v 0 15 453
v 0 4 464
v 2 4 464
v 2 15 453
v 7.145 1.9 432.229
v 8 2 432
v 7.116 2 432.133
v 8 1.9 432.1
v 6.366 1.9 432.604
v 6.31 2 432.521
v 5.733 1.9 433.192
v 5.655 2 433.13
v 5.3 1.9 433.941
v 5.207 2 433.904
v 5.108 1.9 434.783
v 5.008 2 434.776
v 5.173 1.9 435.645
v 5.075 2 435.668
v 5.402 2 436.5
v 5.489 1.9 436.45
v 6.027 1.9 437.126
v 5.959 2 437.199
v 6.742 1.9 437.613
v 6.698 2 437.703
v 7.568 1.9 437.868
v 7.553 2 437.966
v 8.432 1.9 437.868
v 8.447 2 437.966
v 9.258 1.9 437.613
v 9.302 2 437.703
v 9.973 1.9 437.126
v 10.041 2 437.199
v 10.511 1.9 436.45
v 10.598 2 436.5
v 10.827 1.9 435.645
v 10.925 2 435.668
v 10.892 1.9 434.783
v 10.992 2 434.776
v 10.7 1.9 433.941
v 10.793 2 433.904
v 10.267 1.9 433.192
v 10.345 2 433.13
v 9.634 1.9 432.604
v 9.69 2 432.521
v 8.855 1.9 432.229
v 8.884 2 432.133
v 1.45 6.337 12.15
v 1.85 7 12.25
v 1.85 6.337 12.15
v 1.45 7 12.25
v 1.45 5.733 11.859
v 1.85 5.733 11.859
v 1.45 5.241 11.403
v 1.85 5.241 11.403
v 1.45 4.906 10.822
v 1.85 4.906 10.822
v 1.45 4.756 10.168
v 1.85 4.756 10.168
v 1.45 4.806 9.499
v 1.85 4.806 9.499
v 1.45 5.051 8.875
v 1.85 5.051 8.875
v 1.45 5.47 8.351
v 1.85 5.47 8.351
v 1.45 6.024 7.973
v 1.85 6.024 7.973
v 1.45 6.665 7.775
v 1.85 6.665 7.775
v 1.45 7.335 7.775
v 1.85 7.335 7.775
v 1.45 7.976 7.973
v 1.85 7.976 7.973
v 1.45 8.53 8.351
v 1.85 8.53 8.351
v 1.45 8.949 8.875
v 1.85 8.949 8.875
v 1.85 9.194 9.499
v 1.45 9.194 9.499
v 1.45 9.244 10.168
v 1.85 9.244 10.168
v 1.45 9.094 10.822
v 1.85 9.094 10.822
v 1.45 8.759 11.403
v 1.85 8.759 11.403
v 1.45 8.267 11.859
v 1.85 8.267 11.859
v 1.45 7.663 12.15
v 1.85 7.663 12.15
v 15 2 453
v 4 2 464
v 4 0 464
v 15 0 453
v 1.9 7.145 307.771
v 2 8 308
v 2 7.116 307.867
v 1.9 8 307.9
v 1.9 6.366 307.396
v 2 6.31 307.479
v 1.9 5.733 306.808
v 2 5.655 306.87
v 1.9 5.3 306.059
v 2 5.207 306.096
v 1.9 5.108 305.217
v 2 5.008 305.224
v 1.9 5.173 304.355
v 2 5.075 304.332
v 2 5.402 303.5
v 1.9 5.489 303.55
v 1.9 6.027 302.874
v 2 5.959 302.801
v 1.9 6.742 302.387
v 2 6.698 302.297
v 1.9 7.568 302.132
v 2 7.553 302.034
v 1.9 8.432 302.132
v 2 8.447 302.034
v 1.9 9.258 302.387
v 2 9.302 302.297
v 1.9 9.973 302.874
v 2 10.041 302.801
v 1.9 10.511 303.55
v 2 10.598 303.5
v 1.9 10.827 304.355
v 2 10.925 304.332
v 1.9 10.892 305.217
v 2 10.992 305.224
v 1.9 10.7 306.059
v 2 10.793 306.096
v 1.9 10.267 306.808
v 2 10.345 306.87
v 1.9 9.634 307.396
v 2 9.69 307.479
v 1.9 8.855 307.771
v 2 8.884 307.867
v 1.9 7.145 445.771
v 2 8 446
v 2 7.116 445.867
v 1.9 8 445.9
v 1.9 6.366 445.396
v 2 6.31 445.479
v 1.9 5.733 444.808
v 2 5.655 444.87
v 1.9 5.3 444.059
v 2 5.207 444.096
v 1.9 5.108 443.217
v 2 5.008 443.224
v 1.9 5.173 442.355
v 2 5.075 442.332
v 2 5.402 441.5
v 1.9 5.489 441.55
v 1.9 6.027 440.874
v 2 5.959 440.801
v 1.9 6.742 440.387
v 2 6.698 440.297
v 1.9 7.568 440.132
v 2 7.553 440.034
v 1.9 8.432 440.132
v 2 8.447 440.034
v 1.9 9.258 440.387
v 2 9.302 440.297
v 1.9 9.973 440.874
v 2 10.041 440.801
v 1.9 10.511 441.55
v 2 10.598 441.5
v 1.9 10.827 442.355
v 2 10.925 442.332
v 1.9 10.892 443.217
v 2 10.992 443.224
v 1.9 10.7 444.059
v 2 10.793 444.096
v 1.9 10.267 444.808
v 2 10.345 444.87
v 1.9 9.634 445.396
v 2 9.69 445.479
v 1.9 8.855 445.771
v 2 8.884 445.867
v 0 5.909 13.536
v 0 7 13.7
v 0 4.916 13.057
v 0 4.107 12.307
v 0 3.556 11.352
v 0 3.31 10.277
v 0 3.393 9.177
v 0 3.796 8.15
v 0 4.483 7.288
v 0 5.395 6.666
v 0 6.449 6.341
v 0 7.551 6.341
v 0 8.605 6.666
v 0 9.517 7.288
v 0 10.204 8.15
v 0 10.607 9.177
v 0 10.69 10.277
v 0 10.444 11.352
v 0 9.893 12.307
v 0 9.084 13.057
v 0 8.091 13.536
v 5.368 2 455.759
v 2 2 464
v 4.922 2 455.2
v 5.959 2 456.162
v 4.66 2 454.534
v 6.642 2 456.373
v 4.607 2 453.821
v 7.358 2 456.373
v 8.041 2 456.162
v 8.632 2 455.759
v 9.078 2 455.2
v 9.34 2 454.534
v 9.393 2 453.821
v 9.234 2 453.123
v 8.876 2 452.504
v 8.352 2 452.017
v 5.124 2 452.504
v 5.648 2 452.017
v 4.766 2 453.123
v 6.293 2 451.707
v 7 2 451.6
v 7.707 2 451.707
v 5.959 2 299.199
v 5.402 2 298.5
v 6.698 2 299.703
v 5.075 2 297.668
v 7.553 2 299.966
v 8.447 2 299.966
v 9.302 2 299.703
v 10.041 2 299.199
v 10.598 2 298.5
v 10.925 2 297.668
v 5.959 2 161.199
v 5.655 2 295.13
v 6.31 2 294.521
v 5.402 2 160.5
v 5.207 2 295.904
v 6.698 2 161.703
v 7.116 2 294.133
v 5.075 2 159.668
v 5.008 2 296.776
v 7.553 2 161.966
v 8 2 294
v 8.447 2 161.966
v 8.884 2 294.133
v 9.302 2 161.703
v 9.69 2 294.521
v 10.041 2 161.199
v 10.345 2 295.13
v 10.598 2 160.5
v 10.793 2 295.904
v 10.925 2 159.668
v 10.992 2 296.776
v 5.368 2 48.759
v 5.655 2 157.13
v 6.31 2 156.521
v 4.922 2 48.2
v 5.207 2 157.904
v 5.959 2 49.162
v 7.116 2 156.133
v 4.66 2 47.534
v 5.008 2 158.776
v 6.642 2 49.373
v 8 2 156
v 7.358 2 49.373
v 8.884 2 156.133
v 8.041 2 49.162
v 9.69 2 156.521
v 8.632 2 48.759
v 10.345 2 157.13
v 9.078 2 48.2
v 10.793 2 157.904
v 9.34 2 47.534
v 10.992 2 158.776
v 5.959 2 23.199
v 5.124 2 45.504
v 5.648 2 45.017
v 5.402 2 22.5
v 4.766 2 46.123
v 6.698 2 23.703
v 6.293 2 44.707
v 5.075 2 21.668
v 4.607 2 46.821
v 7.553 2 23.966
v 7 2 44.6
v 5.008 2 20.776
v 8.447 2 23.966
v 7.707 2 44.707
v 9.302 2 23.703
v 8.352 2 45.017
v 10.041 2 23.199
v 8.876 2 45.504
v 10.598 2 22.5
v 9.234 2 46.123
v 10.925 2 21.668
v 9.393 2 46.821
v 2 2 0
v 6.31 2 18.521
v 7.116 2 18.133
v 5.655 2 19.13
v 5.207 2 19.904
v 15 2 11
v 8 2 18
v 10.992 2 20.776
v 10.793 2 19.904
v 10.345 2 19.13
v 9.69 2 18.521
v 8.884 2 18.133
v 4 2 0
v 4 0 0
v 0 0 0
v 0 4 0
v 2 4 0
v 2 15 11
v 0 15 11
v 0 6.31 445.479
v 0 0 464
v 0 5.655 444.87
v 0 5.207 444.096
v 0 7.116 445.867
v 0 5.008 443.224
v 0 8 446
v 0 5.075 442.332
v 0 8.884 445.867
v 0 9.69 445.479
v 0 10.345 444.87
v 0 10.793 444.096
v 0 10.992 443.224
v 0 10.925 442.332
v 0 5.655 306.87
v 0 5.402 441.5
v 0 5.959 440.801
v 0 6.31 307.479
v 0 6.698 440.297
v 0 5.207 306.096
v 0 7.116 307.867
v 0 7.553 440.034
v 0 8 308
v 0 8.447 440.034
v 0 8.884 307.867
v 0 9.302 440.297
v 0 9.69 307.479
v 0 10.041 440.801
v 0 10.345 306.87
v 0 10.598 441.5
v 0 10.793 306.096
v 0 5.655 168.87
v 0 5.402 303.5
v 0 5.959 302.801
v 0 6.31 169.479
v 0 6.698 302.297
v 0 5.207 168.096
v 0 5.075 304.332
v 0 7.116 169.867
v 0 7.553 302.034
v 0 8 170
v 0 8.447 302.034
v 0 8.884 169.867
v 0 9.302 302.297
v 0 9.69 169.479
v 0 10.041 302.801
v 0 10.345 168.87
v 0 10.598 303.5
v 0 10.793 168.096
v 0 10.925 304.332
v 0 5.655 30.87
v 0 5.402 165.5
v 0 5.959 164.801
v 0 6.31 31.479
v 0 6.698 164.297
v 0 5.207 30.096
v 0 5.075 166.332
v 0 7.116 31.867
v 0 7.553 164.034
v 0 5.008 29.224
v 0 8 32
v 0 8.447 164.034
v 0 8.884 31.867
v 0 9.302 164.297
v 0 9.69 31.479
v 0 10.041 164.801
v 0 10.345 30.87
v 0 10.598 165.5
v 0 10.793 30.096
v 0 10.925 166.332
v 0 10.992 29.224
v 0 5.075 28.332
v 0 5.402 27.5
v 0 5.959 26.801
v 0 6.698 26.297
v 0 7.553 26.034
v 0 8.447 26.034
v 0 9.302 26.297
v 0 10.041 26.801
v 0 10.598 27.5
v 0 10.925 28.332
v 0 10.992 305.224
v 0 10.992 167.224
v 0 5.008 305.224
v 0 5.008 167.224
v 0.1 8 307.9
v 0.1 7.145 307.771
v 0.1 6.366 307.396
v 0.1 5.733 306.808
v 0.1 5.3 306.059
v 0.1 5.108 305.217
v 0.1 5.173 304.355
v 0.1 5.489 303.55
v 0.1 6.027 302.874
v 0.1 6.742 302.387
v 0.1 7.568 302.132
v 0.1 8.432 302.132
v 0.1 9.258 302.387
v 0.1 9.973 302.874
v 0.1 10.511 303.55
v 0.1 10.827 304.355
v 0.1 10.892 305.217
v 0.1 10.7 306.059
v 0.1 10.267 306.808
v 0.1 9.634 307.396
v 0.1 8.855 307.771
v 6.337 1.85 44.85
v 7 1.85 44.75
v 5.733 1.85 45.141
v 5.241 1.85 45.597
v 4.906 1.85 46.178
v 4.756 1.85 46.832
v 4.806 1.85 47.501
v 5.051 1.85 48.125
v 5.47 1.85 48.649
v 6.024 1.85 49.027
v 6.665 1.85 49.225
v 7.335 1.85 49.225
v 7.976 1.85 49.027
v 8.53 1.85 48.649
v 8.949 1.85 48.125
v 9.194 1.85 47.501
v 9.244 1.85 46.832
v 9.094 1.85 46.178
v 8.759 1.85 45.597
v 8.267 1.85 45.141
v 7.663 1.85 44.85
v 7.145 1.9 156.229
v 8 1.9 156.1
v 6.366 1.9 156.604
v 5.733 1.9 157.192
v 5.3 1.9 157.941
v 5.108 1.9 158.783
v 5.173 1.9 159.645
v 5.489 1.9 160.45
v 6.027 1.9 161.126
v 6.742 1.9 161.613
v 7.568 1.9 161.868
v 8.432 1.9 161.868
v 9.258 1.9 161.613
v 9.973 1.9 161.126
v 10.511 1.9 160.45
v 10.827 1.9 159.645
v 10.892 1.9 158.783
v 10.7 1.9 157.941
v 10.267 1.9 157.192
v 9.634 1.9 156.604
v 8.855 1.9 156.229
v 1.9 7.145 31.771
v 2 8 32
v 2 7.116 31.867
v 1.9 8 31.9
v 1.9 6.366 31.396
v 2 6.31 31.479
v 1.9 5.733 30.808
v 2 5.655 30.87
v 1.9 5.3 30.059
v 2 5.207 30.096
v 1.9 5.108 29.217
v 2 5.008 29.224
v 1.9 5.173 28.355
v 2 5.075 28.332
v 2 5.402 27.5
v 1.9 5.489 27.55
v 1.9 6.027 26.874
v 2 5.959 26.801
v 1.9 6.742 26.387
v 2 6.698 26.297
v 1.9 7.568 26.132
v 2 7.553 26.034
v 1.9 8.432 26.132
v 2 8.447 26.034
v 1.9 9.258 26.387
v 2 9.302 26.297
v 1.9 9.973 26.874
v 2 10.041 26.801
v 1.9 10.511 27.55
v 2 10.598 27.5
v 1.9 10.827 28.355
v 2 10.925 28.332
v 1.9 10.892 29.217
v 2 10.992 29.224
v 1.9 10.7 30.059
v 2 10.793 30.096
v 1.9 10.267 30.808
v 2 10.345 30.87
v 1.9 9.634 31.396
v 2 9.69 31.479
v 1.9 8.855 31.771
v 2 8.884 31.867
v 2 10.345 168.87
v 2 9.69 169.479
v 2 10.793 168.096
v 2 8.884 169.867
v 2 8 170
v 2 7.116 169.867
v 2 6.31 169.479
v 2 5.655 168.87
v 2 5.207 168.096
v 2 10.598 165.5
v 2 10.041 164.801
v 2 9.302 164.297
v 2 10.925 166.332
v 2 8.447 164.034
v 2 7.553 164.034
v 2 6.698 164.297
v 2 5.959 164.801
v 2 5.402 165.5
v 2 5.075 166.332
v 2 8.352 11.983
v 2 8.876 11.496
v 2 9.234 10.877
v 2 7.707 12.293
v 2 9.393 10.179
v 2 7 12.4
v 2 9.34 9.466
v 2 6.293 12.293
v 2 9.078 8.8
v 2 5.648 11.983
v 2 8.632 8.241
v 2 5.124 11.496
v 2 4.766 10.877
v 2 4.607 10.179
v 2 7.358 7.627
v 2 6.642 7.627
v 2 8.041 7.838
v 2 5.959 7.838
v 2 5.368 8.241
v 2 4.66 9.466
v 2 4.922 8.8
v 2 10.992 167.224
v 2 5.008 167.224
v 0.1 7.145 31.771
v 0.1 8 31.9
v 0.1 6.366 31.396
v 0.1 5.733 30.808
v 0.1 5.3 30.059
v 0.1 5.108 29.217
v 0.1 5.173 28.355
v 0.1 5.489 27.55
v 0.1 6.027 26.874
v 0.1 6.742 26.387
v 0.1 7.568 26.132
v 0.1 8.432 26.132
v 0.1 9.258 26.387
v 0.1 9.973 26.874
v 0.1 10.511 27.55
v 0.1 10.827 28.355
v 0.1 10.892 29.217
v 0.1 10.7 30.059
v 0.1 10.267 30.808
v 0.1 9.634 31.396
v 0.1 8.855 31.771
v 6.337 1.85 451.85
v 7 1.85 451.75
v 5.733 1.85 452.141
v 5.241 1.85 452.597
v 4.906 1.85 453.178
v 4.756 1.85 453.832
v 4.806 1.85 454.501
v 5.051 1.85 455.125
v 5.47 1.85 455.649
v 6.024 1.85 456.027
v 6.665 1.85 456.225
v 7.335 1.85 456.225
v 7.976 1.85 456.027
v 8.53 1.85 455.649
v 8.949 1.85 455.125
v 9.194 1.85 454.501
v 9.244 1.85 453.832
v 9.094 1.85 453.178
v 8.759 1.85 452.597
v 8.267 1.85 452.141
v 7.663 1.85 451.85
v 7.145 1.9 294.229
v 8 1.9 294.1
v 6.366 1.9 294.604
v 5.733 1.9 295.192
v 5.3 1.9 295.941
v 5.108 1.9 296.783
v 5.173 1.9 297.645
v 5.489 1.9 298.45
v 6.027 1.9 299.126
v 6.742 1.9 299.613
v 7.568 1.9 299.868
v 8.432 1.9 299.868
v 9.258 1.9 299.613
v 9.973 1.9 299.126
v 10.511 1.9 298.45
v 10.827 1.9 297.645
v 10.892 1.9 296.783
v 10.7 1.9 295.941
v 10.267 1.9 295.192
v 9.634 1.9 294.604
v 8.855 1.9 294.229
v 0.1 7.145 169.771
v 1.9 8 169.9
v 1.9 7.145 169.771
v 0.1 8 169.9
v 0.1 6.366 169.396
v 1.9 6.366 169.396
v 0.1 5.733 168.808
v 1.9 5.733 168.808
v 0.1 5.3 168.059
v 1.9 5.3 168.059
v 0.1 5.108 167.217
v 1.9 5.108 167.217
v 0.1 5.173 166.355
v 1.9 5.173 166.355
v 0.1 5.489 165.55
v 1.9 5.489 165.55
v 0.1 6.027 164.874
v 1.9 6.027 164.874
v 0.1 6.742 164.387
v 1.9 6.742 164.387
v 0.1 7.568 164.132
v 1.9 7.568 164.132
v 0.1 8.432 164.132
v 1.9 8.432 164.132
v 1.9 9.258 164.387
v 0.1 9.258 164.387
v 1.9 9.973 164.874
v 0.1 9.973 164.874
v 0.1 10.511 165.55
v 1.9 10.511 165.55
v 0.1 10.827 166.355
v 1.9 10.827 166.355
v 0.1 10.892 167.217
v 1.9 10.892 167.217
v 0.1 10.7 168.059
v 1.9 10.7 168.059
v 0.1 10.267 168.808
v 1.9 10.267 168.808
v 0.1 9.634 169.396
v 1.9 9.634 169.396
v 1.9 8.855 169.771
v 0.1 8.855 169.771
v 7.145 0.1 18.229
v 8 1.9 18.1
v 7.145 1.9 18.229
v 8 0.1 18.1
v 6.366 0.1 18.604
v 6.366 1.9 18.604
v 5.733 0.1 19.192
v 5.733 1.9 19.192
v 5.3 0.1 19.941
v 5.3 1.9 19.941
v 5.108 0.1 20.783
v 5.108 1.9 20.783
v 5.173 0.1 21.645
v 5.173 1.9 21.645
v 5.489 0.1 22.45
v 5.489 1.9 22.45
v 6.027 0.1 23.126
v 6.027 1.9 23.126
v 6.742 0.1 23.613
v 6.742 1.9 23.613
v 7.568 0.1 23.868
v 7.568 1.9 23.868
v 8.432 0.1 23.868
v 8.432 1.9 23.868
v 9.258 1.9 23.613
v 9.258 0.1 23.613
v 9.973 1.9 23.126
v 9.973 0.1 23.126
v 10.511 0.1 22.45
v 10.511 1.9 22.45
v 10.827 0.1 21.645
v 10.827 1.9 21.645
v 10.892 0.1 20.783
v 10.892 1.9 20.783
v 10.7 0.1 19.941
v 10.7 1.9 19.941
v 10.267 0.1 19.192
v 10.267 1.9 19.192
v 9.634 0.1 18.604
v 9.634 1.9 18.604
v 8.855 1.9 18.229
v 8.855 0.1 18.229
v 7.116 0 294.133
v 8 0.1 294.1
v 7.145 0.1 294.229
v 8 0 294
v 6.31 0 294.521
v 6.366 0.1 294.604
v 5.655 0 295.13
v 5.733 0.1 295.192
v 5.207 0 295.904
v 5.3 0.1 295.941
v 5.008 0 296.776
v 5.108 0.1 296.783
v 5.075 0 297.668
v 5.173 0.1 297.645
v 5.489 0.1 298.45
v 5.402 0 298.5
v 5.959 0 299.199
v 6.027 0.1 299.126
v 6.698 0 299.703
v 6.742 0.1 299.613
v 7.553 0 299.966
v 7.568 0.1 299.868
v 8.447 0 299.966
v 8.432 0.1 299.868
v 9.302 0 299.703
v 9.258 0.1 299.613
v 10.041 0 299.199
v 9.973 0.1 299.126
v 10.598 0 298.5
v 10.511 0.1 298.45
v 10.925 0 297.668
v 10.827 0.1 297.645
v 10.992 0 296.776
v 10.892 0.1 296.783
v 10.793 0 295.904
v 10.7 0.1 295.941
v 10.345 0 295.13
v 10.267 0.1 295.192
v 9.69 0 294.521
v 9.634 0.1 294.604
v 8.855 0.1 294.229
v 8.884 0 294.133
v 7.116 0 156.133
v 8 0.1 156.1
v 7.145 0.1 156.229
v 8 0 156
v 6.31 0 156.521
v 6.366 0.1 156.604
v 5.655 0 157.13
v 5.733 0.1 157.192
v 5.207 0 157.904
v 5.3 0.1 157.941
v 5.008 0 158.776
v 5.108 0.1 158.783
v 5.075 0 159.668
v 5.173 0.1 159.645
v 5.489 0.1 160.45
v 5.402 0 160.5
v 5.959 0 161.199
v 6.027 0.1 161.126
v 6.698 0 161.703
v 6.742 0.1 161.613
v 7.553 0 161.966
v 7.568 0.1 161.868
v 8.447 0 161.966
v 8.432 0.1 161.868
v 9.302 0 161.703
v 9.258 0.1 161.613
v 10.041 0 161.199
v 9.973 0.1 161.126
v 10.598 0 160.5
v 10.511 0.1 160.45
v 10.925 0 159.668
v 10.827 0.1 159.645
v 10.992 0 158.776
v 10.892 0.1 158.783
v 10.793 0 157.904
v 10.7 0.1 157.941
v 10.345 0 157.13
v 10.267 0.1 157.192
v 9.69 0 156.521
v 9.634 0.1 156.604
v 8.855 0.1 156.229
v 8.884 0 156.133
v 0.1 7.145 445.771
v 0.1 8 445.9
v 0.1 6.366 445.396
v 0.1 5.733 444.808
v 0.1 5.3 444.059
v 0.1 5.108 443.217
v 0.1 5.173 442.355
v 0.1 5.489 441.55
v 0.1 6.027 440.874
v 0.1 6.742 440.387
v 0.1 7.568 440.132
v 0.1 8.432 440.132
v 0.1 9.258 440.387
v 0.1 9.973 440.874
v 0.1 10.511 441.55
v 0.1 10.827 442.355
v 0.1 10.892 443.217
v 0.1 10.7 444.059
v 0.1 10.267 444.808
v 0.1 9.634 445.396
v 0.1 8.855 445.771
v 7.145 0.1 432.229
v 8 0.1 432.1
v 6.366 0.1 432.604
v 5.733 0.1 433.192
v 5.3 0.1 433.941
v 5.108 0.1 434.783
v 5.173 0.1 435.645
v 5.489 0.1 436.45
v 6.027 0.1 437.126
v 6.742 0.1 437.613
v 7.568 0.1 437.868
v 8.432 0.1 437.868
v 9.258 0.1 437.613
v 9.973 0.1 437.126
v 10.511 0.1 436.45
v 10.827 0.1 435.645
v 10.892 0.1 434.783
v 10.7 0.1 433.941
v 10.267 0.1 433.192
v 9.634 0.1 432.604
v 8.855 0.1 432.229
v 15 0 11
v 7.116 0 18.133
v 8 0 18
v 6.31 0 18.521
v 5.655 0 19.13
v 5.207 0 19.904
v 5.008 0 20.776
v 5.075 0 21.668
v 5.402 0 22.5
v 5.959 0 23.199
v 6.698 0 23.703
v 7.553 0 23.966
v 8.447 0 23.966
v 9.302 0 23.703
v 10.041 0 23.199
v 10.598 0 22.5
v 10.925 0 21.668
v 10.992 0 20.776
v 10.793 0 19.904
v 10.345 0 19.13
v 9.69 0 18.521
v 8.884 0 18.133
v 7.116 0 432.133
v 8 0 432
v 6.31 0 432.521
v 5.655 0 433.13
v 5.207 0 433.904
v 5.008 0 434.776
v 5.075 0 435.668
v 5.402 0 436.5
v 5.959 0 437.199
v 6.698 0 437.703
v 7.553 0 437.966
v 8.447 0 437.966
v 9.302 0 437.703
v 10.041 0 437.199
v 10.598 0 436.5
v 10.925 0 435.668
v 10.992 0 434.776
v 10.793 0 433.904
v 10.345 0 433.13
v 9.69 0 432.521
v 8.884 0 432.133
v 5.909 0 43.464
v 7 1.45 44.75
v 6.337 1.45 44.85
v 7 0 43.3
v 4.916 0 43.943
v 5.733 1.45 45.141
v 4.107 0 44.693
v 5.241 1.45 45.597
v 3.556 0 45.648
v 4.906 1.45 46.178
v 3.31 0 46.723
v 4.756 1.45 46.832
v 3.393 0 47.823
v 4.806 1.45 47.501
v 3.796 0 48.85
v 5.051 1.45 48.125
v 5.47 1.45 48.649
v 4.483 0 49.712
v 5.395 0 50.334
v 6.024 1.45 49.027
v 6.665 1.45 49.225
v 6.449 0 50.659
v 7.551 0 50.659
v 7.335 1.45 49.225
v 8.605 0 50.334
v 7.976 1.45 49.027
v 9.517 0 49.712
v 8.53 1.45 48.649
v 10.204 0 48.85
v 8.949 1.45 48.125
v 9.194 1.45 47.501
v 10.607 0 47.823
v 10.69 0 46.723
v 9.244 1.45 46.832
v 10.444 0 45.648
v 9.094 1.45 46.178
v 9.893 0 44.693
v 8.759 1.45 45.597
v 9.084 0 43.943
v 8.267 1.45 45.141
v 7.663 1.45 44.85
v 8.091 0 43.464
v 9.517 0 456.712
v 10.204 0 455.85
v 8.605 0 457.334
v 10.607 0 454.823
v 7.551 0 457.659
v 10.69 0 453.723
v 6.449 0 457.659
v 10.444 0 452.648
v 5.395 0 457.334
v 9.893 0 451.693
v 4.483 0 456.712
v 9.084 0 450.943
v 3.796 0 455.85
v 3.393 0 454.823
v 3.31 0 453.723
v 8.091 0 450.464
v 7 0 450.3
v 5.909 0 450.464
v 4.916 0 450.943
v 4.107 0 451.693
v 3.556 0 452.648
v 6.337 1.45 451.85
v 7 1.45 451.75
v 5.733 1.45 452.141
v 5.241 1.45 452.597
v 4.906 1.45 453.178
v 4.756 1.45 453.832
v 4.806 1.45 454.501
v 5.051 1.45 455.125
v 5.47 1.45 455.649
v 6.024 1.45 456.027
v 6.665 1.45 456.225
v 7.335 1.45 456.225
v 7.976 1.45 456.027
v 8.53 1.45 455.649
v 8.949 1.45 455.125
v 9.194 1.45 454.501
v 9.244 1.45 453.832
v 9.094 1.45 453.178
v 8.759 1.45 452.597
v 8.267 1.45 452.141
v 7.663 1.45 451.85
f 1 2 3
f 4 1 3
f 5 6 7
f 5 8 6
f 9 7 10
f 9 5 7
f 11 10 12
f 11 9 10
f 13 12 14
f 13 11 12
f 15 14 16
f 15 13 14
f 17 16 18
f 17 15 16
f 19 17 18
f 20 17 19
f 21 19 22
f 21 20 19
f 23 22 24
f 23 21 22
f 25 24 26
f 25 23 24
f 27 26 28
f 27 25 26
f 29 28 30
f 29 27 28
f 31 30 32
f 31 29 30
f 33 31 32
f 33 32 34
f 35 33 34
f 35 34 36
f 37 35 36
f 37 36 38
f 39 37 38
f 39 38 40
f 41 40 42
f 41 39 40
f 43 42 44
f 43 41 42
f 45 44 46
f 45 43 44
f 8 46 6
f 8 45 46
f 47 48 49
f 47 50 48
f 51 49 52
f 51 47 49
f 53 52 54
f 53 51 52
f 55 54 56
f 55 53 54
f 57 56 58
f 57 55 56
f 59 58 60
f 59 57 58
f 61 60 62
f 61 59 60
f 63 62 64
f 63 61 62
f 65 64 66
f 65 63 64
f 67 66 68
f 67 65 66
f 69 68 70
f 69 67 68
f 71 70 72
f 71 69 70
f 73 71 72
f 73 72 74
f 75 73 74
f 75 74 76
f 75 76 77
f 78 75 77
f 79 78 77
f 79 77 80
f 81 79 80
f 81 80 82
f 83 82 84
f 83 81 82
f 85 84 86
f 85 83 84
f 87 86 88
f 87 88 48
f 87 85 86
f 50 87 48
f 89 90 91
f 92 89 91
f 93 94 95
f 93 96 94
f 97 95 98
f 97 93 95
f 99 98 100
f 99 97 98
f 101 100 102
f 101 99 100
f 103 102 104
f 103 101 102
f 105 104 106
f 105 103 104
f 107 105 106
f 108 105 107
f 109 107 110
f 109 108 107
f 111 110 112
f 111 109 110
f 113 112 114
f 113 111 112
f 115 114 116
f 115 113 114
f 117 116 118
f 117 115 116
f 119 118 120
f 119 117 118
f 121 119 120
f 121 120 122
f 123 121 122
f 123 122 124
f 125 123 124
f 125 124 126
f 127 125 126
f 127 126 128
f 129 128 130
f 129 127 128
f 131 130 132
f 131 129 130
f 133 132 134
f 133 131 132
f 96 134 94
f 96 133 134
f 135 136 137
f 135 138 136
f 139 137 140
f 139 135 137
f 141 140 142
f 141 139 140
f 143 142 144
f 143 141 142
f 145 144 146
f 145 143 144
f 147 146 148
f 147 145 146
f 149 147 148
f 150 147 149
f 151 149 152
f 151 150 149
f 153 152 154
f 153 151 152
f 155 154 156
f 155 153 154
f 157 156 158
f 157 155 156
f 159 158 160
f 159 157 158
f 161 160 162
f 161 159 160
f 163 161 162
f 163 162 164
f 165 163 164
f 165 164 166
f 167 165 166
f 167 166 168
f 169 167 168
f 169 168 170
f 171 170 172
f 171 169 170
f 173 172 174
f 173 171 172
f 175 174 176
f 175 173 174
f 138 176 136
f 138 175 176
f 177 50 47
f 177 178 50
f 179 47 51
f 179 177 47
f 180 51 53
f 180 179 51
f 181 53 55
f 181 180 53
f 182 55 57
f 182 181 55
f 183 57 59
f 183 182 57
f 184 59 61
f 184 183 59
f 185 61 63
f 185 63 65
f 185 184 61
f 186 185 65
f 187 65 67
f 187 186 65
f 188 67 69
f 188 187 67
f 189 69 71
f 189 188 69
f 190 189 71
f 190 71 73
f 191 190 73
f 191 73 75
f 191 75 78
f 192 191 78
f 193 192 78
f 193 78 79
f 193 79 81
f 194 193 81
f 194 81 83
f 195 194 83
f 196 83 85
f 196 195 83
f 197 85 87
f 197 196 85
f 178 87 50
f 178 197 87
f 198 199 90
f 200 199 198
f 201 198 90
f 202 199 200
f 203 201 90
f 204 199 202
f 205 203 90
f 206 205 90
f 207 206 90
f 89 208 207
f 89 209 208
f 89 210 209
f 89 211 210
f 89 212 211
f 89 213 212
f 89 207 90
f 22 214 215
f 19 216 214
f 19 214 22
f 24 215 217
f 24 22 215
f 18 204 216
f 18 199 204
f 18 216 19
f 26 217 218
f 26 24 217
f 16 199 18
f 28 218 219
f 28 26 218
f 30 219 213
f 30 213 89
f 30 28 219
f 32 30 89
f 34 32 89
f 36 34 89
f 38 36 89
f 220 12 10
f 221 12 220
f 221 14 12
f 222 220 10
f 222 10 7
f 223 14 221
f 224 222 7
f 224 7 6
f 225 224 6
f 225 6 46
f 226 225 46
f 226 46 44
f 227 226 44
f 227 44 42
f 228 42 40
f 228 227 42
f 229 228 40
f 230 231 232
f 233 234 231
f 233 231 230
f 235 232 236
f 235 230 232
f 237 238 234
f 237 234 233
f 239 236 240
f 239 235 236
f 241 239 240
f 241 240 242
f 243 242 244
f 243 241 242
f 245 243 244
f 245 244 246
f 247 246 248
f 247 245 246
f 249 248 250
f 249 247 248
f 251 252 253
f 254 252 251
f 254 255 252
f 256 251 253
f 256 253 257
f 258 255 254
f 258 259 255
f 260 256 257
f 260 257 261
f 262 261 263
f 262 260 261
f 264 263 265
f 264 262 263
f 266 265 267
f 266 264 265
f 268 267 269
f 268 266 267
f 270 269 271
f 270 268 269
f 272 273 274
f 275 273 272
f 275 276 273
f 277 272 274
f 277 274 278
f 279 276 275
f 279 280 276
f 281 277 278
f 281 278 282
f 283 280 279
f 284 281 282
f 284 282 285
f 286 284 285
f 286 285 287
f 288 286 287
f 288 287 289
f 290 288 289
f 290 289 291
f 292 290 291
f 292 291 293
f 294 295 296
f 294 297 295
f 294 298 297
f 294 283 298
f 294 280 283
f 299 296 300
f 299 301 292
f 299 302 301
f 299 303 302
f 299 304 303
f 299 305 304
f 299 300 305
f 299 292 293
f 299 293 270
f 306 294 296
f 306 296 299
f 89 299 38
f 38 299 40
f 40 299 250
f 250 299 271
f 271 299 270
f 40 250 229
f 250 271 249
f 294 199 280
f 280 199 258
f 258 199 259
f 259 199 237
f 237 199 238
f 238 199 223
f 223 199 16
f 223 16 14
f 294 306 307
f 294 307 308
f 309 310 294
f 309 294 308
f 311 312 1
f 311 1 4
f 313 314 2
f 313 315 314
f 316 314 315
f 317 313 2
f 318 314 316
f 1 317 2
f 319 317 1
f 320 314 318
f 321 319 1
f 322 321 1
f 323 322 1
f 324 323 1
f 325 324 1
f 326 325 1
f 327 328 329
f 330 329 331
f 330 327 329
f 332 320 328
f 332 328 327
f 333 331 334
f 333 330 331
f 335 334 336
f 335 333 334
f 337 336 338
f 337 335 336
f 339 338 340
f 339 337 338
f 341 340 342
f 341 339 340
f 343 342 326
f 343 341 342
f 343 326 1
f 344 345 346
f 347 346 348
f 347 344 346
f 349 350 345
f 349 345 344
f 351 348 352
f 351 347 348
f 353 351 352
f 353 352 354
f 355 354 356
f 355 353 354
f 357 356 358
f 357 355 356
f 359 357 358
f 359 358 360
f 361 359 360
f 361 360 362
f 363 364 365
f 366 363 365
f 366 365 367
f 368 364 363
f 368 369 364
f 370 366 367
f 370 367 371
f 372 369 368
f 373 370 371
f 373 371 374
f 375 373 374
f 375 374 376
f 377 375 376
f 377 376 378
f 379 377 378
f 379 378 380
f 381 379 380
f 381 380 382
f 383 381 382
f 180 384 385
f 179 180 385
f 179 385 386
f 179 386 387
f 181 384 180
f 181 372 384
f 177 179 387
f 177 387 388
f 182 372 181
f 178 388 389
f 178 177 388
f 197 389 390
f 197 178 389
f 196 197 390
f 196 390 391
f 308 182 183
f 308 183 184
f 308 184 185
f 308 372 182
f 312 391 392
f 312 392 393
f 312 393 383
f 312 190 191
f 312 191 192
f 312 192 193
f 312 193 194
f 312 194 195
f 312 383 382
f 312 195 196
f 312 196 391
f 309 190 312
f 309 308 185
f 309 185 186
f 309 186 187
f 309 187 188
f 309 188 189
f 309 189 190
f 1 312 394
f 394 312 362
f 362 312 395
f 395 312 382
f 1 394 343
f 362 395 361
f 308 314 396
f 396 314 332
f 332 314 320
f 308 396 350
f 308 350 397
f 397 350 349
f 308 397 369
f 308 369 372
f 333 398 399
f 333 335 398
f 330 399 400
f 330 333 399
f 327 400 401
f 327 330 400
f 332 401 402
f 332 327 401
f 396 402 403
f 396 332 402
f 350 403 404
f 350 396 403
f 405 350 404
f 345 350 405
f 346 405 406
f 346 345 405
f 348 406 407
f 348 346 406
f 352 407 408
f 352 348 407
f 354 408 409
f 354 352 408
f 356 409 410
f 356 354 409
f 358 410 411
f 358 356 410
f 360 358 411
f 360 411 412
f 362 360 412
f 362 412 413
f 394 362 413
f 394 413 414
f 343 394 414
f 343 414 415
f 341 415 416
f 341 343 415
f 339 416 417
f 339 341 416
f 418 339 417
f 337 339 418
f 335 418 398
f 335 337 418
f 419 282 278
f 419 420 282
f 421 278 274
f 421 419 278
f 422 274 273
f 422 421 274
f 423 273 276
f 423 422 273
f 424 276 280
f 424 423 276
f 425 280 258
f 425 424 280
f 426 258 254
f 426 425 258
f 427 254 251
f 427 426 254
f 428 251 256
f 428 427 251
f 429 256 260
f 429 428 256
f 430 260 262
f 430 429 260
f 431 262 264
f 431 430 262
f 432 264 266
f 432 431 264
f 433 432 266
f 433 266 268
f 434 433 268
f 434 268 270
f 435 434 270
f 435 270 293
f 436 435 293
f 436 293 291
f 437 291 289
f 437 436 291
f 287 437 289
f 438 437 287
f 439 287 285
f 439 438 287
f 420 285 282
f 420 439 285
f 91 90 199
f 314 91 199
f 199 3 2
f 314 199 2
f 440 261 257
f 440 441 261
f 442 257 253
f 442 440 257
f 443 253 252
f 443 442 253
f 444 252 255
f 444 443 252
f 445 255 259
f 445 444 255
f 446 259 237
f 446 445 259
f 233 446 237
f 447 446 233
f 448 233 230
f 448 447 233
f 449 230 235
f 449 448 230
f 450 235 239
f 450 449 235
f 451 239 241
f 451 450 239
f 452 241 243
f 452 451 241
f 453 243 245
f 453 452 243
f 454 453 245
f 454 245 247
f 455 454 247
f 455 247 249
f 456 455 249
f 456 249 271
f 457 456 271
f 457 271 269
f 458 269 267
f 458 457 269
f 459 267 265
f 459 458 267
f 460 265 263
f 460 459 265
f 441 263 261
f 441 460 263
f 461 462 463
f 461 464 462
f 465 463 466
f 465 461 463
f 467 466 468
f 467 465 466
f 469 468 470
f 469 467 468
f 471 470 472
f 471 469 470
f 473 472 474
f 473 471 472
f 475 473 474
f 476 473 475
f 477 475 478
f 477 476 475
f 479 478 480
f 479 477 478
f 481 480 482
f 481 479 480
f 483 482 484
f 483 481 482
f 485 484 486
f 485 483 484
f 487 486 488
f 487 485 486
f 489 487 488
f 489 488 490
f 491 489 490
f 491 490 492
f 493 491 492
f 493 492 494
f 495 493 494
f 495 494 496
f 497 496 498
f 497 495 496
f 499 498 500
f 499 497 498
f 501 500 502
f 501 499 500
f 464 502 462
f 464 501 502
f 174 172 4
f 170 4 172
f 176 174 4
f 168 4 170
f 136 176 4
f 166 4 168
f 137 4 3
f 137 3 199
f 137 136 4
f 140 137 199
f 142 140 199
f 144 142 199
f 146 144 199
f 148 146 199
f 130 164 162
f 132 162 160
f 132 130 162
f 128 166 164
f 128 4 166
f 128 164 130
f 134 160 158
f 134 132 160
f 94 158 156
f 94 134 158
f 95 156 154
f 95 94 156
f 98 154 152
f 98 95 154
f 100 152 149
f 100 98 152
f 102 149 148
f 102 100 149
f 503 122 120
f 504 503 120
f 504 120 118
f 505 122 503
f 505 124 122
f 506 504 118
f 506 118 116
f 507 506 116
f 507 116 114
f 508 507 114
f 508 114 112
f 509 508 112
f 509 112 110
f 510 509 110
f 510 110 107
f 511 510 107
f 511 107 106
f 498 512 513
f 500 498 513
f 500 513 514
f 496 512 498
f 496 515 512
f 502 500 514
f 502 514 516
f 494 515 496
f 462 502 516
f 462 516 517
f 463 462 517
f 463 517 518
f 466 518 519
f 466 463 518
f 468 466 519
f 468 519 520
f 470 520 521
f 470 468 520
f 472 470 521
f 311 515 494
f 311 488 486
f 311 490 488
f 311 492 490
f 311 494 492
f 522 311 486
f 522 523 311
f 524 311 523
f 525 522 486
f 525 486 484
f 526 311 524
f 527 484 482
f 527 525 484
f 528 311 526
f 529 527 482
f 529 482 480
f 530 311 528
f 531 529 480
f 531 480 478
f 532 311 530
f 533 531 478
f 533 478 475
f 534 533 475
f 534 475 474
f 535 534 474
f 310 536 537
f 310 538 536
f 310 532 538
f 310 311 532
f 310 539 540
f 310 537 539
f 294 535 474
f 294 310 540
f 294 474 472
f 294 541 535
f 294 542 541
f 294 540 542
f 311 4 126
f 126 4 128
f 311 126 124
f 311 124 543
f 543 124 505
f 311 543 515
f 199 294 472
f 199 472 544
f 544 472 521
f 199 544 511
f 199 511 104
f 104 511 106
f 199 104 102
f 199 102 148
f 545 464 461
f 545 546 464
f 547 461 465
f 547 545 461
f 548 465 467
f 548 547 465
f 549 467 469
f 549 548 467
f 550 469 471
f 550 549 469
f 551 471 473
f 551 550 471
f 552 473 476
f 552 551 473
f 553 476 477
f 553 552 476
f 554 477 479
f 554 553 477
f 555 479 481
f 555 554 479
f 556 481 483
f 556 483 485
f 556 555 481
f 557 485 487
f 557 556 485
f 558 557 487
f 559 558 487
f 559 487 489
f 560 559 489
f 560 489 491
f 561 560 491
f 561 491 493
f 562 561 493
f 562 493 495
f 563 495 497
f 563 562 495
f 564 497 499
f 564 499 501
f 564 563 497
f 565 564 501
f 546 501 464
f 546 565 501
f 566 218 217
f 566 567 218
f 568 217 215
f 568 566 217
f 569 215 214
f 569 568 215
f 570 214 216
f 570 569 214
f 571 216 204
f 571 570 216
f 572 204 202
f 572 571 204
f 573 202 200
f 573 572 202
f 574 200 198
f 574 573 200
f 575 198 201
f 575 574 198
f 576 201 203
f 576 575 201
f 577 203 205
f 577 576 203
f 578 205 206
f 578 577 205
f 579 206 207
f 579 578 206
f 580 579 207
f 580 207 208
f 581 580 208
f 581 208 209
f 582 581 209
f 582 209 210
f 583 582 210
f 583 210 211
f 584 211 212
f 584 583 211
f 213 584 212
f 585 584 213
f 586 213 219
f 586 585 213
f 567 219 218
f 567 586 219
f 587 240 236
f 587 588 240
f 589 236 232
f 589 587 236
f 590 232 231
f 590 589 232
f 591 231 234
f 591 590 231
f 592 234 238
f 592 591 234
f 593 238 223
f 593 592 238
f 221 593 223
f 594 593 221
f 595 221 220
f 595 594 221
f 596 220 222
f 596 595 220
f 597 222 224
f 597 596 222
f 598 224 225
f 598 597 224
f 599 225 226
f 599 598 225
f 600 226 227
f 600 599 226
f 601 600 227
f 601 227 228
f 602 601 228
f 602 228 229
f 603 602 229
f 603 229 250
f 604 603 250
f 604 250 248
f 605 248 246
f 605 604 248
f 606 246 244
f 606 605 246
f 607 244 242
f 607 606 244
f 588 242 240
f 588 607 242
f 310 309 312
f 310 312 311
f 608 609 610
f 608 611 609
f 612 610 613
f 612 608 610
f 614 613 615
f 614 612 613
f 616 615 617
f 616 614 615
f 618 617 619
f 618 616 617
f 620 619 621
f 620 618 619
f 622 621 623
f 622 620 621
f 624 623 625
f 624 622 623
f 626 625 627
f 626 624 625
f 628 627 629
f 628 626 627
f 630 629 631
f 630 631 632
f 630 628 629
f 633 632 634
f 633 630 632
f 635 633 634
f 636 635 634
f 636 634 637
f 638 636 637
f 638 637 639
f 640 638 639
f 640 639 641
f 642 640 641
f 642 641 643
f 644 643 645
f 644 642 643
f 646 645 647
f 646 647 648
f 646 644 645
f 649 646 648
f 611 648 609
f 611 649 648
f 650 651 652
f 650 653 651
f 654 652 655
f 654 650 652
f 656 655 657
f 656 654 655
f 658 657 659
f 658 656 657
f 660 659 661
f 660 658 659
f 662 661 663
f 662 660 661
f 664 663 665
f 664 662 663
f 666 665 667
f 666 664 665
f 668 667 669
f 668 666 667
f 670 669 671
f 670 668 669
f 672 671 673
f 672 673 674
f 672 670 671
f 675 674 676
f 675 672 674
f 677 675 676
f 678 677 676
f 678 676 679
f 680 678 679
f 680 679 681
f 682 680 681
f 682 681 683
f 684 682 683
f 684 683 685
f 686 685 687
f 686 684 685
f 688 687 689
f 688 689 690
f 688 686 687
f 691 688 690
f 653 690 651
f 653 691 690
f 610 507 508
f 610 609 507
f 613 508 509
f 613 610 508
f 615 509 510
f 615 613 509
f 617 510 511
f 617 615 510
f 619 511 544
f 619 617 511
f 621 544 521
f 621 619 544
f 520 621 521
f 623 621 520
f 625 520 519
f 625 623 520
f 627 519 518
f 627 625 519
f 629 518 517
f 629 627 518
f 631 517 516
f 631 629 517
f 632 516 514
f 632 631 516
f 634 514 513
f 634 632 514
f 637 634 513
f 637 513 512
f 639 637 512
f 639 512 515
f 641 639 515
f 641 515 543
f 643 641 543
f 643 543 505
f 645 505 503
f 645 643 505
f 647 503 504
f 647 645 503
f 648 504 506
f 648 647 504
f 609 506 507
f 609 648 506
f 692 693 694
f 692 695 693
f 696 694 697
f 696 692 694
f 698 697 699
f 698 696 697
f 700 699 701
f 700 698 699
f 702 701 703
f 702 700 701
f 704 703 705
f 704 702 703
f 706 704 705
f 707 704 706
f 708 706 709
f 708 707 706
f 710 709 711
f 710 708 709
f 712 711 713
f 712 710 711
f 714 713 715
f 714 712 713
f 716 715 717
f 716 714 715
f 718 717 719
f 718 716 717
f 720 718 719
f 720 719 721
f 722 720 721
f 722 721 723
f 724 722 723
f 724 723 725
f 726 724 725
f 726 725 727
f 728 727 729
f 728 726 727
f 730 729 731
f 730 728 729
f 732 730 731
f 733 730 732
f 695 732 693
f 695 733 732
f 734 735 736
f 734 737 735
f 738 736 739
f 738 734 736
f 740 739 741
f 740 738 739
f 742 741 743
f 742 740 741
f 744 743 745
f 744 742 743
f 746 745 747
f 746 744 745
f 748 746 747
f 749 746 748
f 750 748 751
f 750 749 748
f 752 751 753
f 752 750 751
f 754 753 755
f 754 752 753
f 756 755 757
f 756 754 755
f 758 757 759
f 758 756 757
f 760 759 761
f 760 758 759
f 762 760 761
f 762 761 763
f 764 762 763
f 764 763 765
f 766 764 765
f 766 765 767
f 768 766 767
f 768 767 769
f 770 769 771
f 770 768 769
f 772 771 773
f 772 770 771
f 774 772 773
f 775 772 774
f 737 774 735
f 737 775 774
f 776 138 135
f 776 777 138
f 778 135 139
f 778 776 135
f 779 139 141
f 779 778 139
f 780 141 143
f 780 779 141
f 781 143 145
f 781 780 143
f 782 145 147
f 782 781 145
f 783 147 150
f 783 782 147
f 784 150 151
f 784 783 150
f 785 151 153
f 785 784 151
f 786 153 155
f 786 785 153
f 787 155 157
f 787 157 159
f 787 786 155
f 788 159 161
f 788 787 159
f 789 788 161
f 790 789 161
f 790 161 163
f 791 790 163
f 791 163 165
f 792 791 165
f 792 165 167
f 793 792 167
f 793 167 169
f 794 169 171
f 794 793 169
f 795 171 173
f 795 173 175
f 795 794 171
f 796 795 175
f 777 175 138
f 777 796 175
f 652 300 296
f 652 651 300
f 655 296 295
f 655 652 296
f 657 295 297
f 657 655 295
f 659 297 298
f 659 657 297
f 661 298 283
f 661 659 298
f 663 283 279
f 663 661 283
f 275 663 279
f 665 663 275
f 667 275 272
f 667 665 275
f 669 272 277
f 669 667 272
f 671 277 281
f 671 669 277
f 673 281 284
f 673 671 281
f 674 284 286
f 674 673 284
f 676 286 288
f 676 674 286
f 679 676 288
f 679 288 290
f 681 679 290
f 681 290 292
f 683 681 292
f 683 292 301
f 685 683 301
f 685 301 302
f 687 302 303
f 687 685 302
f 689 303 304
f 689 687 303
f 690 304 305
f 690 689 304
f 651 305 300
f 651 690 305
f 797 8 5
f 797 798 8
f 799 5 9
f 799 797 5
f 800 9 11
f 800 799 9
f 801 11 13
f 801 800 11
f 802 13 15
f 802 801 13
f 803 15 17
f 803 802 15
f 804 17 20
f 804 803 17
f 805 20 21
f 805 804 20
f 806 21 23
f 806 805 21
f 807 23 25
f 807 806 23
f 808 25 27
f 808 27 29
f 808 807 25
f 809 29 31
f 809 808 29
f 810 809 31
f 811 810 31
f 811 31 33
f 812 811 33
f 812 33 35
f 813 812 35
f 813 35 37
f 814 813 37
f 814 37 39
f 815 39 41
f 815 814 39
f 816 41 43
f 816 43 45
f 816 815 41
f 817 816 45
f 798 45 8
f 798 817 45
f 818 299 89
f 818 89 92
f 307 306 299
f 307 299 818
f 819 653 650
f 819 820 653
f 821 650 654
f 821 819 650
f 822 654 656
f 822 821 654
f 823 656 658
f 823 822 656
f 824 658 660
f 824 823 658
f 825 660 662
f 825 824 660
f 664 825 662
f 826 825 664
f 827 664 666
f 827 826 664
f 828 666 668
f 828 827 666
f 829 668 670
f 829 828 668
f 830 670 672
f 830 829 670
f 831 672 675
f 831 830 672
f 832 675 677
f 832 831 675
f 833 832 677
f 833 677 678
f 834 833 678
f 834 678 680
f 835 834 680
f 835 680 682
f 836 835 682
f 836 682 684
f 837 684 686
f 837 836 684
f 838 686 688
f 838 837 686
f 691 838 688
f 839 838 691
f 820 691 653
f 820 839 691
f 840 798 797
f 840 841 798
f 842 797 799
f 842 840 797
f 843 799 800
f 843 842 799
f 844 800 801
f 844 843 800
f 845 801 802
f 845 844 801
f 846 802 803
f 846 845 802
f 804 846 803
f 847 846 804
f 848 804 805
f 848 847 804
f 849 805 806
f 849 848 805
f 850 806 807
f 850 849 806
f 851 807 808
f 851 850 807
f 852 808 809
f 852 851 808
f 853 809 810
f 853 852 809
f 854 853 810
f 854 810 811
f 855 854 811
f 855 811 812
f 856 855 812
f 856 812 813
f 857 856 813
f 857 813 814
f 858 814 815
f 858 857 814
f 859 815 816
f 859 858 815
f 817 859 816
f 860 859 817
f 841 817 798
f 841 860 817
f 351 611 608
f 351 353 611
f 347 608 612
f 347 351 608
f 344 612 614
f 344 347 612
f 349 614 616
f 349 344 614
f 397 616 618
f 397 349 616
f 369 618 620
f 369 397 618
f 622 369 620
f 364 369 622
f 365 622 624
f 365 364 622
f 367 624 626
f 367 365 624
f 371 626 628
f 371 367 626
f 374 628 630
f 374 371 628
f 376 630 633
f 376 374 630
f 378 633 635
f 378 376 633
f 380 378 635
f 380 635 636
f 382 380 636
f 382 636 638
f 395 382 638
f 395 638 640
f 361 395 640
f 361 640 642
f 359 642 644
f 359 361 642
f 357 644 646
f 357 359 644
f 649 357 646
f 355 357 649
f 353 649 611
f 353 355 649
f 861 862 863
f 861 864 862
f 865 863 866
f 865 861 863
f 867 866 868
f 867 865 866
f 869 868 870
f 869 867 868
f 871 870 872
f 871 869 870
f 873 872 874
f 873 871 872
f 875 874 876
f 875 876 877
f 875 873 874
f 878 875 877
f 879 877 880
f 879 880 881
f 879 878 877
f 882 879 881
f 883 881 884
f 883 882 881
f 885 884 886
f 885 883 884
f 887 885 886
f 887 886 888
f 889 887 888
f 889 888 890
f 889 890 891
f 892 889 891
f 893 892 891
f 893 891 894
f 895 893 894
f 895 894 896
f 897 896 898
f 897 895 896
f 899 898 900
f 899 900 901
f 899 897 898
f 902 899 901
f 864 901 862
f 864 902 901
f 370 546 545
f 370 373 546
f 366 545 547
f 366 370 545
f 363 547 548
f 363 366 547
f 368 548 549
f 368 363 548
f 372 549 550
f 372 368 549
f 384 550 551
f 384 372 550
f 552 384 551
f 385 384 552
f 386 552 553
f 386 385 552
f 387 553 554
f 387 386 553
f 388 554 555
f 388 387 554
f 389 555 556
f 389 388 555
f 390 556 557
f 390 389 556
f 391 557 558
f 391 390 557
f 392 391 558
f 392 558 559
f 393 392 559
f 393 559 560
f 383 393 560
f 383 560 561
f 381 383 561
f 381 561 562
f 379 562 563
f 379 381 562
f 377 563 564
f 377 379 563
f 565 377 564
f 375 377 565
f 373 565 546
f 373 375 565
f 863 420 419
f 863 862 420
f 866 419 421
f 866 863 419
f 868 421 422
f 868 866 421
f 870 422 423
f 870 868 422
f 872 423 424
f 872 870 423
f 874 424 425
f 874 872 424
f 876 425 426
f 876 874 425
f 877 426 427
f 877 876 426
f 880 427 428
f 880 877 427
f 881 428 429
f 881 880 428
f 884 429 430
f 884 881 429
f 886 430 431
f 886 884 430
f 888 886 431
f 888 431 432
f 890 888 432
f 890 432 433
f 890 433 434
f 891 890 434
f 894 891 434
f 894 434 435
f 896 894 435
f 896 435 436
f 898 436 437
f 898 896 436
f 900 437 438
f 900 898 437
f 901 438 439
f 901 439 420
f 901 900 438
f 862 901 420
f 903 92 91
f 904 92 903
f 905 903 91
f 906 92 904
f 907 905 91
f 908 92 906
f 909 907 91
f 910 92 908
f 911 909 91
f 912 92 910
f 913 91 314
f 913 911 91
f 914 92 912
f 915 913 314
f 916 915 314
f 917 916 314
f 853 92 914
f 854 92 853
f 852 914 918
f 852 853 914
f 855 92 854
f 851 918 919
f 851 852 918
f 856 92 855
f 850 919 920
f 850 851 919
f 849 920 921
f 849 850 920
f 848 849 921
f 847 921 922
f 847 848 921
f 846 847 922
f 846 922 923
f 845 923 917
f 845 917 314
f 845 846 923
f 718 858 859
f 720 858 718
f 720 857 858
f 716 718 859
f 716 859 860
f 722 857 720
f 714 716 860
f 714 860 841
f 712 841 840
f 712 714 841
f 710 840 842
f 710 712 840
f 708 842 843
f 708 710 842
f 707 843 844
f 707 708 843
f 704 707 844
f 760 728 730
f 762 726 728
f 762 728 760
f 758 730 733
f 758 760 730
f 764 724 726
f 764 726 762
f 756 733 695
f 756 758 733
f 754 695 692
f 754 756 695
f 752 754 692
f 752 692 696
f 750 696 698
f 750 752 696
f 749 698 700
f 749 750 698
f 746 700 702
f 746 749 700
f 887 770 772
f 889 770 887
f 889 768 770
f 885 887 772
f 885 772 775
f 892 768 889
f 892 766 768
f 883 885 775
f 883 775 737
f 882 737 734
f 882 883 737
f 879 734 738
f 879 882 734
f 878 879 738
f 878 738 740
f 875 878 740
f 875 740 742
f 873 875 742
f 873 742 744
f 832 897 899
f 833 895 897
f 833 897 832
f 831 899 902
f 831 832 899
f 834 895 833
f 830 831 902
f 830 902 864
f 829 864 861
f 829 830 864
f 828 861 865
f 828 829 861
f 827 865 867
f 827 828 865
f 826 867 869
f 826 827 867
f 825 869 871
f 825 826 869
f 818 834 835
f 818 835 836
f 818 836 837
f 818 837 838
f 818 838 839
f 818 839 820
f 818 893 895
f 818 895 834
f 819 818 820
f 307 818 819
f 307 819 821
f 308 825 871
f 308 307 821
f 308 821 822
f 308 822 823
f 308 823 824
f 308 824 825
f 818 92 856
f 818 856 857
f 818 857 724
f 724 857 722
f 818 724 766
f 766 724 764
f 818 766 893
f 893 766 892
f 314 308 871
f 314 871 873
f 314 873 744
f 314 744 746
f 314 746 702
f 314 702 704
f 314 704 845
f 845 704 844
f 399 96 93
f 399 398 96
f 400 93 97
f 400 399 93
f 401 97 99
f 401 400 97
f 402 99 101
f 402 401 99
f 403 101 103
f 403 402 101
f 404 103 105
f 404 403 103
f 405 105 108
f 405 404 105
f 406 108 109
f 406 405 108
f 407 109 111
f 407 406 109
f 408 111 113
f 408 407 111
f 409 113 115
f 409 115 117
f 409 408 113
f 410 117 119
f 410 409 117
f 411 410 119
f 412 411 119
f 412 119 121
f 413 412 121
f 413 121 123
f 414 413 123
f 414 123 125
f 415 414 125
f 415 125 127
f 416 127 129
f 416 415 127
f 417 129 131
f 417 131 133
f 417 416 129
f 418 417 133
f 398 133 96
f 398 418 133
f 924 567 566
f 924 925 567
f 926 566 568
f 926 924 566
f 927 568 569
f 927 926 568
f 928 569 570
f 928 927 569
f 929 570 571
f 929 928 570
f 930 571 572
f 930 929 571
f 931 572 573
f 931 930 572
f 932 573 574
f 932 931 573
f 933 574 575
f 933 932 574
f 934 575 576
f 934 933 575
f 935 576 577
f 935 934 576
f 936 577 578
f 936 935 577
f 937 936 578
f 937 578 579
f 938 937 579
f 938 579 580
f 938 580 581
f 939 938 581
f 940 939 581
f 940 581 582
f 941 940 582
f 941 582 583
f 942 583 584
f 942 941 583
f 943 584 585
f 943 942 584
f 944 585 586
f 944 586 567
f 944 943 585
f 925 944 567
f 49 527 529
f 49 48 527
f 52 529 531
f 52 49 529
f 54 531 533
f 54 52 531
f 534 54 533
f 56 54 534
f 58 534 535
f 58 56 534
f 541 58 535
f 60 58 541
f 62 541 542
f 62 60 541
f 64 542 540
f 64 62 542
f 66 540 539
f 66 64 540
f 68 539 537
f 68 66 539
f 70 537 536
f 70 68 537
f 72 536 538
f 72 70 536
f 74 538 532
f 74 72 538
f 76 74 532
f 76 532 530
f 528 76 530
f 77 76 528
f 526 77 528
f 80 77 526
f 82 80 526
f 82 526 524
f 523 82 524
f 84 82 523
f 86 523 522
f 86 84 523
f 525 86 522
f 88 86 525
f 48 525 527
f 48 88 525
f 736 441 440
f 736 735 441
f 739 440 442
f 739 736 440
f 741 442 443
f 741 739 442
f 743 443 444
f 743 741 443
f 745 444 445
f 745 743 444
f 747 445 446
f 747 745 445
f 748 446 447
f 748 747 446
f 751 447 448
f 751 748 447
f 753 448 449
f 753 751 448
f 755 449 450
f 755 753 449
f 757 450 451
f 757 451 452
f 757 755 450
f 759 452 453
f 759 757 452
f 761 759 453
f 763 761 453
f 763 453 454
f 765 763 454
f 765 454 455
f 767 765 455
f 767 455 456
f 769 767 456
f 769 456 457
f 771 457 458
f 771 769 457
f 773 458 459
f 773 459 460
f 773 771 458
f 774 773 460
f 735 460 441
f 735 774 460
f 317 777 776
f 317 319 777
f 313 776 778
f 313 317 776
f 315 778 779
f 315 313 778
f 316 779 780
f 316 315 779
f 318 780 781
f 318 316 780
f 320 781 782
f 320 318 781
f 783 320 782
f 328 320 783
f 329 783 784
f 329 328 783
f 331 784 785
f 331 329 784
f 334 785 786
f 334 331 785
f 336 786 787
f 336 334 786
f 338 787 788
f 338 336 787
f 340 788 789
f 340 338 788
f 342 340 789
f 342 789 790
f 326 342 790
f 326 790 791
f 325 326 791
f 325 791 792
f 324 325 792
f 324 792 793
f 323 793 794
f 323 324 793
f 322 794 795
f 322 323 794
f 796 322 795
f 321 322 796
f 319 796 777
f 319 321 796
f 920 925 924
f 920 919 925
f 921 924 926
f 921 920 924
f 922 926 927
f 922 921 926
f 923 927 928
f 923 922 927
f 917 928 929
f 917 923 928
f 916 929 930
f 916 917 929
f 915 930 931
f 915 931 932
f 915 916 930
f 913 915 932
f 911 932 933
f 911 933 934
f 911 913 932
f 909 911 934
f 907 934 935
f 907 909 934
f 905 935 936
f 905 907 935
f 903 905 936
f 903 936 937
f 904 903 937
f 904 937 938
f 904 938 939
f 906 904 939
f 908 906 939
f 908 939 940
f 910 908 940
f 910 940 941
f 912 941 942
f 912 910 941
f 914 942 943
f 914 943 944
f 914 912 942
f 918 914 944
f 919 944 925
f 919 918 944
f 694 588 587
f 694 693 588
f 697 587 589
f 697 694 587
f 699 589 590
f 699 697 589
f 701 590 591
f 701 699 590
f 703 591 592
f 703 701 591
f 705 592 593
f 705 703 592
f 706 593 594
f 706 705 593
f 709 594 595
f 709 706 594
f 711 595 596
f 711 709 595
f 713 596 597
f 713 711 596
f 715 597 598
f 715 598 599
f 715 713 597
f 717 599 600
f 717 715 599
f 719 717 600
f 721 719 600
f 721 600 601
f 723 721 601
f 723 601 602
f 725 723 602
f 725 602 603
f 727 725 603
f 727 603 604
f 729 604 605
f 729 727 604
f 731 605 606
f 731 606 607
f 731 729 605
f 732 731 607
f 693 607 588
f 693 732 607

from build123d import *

# Parameters (mm, degrees)
EXTRUDE_1_DEPTH            = 464
CHAMFER_1_SIZE             = 11
HOLE_WIZARD_M41_AT_2_COUNT = 2
HOLE_WIZARD_M41_AT_2_PITCH = 407
HOLE_WIZARD_M51_AT_2_COUNT = 2
HOLE_WIZARD_M51_AT_2_PITCH = 138
HOLE_WIZARD_M51_AT_3_COUNT = 2
HOLE_WIZARD_M51_AT_3_PITCH = 276
HOLE_WIZARD_M51_AT_4_COUNT = 2
HOLE_WIZARD_M51_AT_4_PITCH = 414
HOLE_WIZARD_M52_AT_2_COUNT = 2
HOLE_WIZARD_M52_AT_2_PITCH = 138
HOLE_WIZARD_M52_AT_3_COUNT = 2
HOLE_WIZARD_M52_AT_3_PITCH = 276
HOLE_WIZARD_M52_AT_4_COUNT = 2
HOLE_WIZARD_M52_AT_4_PITCH = 414


with BuildPart() as part:
    # Эскиз1 → Бобышка-Вытянуть1 (new body)
    with BuildSketch(Plane.XY):
        Polygon((0, 0), (0, 15), (2, 15), (2, 2), (15, 2), (15, 0), align=None)
    extrude(amount=EXTRUDE_1_DEPTH)

    # Фаска1
    chamfer_1_edges = [part.edges().sort_by_distance(p)[0] for p in [
        (1, 15, 464),
        (1, 15, 0),
        (15, 1, 464),
        (15, 1, 0),
    ]]
    chamfer(chamfer_1_edges, length=CHAMFER_1_SIZE)

    # Эскиз2 → Зенковка для винта с потайной головкой M41 (revolve, cut)
    with BuildSketch(Plane(origin=(7, 0, 454), x_dir=(0, 0, -1), z_dir=(1, 0, 0))):
        Polygon((0, 0), (0, 2), (2.4, 2), (2.25, 1.85), (2.25, 1.45), (3.7, 0), align=None)
    hole_wizard_m41 = revolve(axis=Axis((7, -6.35, 454), (0, 1, 0)), mode=Mode.SUBTRACT)

    # Зенковка для винта с потайной головкой M41 at 2: Зенковка для винта с потайной головкой M41 ×2
    with Locations(*[(0, 0, -i * HOLE_WIZARD_M41_AT_2_PITCH) for i in range(1, HOLE_WIZARD_M41_AT_2_COUNT)]):
        add(hole_wizard_m41, mode=Mode.SUBTRACT)

    # Эскиз6 → Зенковка для винта с потайной головкой M42 (revolve, cut)
    with BuildSketch(Plane(origin=(0, 7, 10), x_dir=(0, 0, 1), z_dir=(0, 1, 0))):
        Polygon((0, 0), (0, 2), (2.4, 2), (2.25, 1.85), (2.25, 1.45), (3.7, 0), align=None)
    revolve(axis=Axis((-6.35, 7, 10), (1, 0, 0)), mode=Mode.SUBTRACT)

    # Эскиз8 → Отверстие с зазором M51 (revolve, cut)
    with BuildSketch(Plane(origin=(0, 8, 29), x_dir=(0, 0, 1), z_dir=(0, 1, 0))):
        Polygon((0, 0), (0, 2), (3, 2), (2.9, 1.9), (2.9, 0.1), (3, 0), align=None)
    hole_wizard_m51 = revolve(axis=Axis((-6.35, 8, 29), (1, 0, 0)), mode=Mode.SUBTRACT)

    # Отверстие с зазором M51 at 2: Отверстие с зазором M51 ×2
    with Locations(*[(0, 0, i * HOLE_WIZARD_M51_AT_2_PITCH) for i in range(1, HOLE_WIZARD_M51_AT_2_COUNT)]):
        add(hole_wizard_m51, mode=Mode.SUBTRACT)

    # Отверстие с зазором M51 at 3: Отверстие с зазором M51 ×2
    with Locations(*[(0, 0, i * HOLE_WIZARD_M51_AT_3_PITCH) for i in range(1, HOLE_WIZARD_M51_AT_3_COUNT)]):
        add(hole_wizard_m51, mode=Mode.SUBTRACT)

    # Отверстие с зазором M51 at 4: Отверстие с зазором M51 ×2
    with Locations(*[(0, 0, i * HOLE_WIZARD_M51_AT_4_PITCH) for i in range(1, HOLE_WIZARD_M51_AT_4_COUNT)]):
        add(hole_wizard_m51, mode=Mode.SUBTRACT)

    # Эскиз10 → Отверстие с зазором M52 (revolve, cut)
    with BuildSketch(Plane(origin=(8, 0, 21), x_dir=(0, 0, -1), z_dir=(1, 0, 0))):
        Polygon((0, 0), (0, 2), (3, 2), (2.9, 1.9), (2.9, 0.1), (3, 0), align=None)
    hole_wizard_m52 = revolve(axis=Axis((8, -6.35, 21), (0, 1, 0)), mode=Mode.SUBTRACT)

    # Отверстие с зазором M52 at 2: Отверстие с зазором M52 ×2
    with Locations(*[(0, 0, i * HOLE_WIZARD_M52_AT_2_PITCH) for i in range(1, HOLE_WIZARD_M52_AT_2_COUNT)]):
        add(hole_wizard_m52, mode=Mode.SUBTRACT)

    # Отверстие с зазором M52 at 3: Отверстие с зазором M52 ×2
    with Locations(*[(0, 0, i * HOLE_WIZARD_M52_AT_3_PITCH) for i in range(1, HOLE_WIZARD_M52_AT_3_COUNT)]):
        add(hole_wizard_m52, mode=Mode.SUBTRACT)

    # Отверстие с зазором M52 at 4: Отверстие с зазором M52 ×2
    with Locations(*[(0, 0, i * HOLE_WIZARD_M52_AT_4_PITCH) for i in range(1, HOLE_WIZARD_M52_AT_4_COUNT)]):
        add(hole_wizard_m52, mode=Mode.SUBTRACT)


solid = part.part
